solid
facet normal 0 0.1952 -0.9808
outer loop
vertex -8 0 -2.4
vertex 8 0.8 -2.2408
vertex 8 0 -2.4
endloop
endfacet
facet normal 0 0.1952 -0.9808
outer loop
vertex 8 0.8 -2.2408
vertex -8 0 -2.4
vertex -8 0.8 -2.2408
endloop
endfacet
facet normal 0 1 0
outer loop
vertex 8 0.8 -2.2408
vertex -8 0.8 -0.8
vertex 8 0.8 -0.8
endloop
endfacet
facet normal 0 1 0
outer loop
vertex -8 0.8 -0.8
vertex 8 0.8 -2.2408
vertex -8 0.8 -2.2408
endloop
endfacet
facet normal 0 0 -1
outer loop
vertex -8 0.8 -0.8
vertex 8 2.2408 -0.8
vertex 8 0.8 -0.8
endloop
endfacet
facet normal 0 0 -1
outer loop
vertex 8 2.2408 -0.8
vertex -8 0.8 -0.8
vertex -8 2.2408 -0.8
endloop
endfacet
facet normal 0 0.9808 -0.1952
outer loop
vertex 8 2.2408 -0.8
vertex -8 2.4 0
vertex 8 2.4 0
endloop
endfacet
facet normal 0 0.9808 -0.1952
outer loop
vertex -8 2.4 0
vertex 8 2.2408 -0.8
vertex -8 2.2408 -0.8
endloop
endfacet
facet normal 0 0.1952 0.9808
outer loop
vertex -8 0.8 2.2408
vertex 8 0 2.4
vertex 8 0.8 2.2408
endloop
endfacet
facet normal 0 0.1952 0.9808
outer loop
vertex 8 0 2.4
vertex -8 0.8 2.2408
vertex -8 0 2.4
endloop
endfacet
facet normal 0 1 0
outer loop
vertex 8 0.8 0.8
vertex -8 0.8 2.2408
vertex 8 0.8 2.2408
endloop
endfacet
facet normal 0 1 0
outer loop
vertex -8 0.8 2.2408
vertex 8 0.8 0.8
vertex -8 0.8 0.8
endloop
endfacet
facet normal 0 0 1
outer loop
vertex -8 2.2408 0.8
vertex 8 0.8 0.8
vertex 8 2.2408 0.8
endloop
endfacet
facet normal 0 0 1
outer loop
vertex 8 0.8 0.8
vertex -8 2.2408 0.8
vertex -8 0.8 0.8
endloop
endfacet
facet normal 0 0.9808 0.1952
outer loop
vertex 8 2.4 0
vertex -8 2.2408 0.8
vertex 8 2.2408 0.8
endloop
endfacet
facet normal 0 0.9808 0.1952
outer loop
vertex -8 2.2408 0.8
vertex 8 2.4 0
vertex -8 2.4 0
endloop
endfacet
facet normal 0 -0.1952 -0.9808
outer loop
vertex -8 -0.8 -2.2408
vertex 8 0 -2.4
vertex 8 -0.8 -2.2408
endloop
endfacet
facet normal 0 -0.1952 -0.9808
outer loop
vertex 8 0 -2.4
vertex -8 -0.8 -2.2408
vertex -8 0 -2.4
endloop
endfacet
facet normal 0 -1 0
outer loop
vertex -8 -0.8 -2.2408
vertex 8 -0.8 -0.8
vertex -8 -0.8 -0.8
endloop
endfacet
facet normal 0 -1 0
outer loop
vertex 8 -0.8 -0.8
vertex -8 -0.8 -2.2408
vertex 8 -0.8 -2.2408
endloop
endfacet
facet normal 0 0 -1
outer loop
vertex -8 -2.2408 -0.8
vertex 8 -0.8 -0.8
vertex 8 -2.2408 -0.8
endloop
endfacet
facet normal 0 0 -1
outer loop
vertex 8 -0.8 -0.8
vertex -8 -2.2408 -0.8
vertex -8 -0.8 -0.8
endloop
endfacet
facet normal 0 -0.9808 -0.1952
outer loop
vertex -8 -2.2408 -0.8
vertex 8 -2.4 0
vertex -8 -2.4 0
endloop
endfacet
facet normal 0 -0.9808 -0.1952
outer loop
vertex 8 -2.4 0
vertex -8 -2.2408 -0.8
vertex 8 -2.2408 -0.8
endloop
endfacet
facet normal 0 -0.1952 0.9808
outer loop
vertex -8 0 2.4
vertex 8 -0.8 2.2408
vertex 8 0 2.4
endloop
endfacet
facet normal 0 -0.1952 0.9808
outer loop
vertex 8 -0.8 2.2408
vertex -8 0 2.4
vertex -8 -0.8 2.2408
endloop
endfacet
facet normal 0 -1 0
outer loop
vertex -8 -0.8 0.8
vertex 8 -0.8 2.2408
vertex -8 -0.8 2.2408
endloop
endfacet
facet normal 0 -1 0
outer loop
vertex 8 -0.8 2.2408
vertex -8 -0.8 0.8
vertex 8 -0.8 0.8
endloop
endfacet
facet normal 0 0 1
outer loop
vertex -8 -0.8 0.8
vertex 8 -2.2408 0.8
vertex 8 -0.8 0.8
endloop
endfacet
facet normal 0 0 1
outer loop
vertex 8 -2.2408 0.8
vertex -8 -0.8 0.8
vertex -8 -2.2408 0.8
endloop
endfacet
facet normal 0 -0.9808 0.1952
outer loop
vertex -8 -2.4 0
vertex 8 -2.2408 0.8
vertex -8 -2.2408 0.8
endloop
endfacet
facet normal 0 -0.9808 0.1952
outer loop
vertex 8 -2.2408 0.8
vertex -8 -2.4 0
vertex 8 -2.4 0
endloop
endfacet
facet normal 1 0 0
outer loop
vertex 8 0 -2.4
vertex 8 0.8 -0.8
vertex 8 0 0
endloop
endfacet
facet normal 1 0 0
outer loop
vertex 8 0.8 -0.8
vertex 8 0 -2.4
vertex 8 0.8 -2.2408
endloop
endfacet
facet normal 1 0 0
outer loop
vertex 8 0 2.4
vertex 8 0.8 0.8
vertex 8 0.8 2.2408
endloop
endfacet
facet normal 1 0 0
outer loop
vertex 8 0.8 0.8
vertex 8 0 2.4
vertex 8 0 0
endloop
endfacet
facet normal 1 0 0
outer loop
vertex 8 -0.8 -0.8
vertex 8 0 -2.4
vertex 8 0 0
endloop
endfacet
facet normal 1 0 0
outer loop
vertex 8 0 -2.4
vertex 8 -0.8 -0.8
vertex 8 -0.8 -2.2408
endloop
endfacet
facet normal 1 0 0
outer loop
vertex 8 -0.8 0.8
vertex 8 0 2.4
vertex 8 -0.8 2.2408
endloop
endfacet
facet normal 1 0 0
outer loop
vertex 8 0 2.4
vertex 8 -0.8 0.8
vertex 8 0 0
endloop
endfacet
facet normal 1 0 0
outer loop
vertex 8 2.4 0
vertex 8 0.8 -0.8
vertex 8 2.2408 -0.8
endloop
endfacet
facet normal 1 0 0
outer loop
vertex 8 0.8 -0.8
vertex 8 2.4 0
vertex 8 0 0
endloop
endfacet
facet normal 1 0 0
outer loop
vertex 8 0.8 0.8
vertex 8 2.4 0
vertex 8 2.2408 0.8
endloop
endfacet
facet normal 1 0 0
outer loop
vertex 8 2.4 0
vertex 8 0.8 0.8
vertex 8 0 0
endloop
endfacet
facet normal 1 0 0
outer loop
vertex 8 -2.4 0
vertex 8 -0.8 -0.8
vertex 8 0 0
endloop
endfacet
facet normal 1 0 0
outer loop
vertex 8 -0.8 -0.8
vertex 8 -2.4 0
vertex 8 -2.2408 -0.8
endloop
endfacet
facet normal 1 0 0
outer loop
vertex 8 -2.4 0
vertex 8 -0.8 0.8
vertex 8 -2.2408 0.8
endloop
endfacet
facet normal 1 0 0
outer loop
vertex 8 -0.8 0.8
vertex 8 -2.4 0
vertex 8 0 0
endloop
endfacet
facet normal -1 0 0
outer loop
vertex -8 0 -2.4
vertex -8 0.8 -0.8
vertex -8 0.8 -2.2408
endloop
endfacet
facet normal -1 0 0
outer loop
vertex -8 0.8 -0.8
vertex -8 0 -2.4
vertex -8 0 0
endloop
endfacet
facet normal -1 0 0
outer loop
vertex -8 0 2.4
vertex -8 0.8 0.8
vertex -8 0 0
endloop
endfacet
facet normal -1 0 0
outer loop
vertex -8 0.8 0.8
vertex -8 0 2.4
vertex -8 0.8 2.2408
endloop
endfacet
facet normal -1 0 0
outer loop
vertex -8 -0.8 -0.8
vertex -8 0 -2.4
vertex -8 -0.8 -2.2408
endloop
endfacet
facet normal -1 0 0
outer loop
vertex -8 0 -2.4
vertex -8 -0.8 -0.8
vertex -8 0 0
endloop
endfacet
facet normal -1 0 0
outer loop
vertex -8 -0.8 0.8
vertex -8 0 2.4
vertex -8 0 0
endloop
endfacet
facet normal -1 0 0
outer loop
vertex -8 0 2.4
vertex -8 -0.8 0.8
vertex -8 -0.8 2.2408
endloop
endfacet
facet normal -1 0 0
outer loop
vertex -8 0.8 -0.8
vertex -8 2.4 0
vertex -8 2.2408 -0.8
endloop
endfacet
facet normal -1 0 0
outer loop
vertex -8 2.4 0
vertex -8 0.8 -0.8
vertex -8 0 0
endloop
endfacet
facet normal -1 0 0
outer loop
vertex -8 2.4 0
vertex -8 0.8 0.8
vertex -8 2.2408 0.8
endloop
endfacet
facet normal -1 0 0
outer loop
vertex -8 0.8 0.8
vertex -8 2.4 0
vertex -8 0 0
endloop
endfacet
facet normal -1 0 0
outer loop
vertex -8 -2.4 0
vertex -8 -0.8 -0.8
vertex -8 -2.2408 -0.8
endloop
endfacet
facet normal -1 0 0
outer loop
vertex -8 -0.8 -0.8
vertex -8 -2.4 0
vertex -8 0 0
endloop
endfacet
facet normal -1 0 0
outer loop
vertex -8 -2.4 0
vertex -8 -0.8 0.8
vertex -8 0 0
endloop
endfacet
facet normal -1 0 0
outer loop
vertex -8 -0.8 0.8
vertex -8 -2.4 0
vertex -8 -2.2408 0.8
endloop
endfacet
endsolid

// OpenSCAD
// file: ../p/axle.scad
use <../lib.scad>
function ldraw_lib__axle() = [
// 0 Axle
// 0 Name: axle.dat
// 0 Author: James Jessiman
// 0 !LDRAW_ORG Primitive UPDATE 2003-01
// 0 !LICENSE Licensed under CC BY 2.0 and CC BY 4.0 : see CAreadme.txt
// 
// 0 BFC CERTIFY CCW
  [0,"BFC","CERTIFY"],
  [0,"BFC","CCW"],
// 
// 0 !HISTORY 2000-04-23 [sbliss] Added conditional edges along outermost diameters
// 0 !HISTORY 2000-05-07 [PTadmin] Official Update 2000-01
// 0 !HISTORY 2002-11-08 [OrionP] Adjusted fit and precision
// 0 !HISTORY 2003-03-12 [PTadmin] Official Update 2003-01
// 0 !HISTORY 2007-06-24 [PTadmin] Header formatted for Contributor Agreement
// 0 !HISTORY 2008-07-01 [PTadmin] Official Update 2008-01
// 
// 
// 5 24 6 0 0 6 1 0 5.602 0 2 5.602 0 -2
  [5,24,6,0,0,6,1,0,5.602,0,2,5.602,0,-2],
// 5 24 0 0 6 0 1 6 2 0 5.602 -2 0 5.602
  [5,24,0,0,6,0,1,6,2,0,5.602,-2,0,5.602],
// 5 24 -6 0 0 -6 1 0 -5.602 0 -2 -5.602 0 2
  [5,24,-6,0,0,-6,1,0,-5.602,0,-2,-5.602,0,2],
// 5 24 0 0 -6 0 1 -6 -2 0 -5.602 2 0 -5.602
  [5,24,0,0,-6,0,1,-6,-2,0,-5.602,2,0,-5.602],
// 
// 2 24 6 0 0 5.602 0 2
  [2,24,6,0,0,5.602,0,2],
// 2 24 5.602 0 2 2 0 2
  [2,24,5.602,0,2,2,0,2],
// 2 24 2 0 2 2 0 5.602
  [2,24,2,0,2,2,0,5.602],
// 2 24 2 0 5.602 0 0 6
  [2,24,2,0,5.602,0,0,6],
// 2 24 -6 0 0 -5.602 0 2
  [2,24,-6,0,0,-5.602,0,2],
// 2 24 -5.602 0 2 -2 0 2
  [2,24,-5.602,0,2,-2,0,2],
// 2 24 -2 0 2 -2 0 5.602
  [2,24,-2,0,2,-2,0,5.602],
// 2 24 -2 0 5.602 -0 0 6
  [2,24,-2,0,5.602,-0,0,6],
// 2 24 6 0 -0 5.602 0 -2
  [2,24,6,0,-0,5.602,0,-2],
// 2 24 5.602 0 -2 2 0 -2
  [2,24,5.602,0,-2,2,0,-2],
// 2 24 2 0 -2 2 0 -5.602
  [2,24,2,0,-2,2,0,-5.602],
// 2 24 2 0 -5.602 0 0 -6
  [2,24,2,0,-5.602,0,0,-6],
// 2 24 -6 0 -0 -5.602 0 -2
  [2,24,-6,0,-0,-5.602,0,-2],
// 2 24 -5.602 0 -2 -2 0 -2
  [2,24,-5.602,0,-2,-2,0,-2],
// 2 24 -2 0 -2 -2 0 -5.602
  [2,24,-2,0,-2,-2,0,-5.602],
// 2 24 -2 0 -5.602 -0 0 -6
  [2,24,-2,0,-5.602,-0,0,-6],
// 2 24 6 1 0 5.602 1 2
  [2,24,6,1,0,5.602,1,2],
// 2 24 5.602 1 2 2 1 2
  [2,24,5.602,1,2,2,1,2],
// 2 24 2 1 2 2 1 5.602
  [2,24,2,1,2,2,1,5.602],
// 2 24 2 1 5.602 0 1 6
  [2,24,2,1,5.602,0,1,6],
// 2 24 -6 1 0 -5.602 1 2
  [2,24,-6,1,0,-5.602,1,2],
// 2 24 -5.602 1 2 -2 1 2
  [2,24,-5.602,1,2,-2,1,2],
// 2 24 -2 1 2 -2 1 5.602
  [2,24,-2,1,2,-2,1,5.602],
// 2 24 -2 1 5.602 -0 1 6
  [2,24,-2,1,5.602,-0,1,6],
// 2 24 6 1 -0 5.602 1 -2
  [2,24,6,1,-0,5.602,1,-2],
// 2 24 5.602 1 -2 2 1 -2
  [2,24,5.602,1,-2,2,1,-2],
// 2 24 2 1 -2 2 1 -5.602
  [2,24,2,1,-2,2,1,-5.602],
// 2 24 2 1 -5.602 0 1 -6
  [2,24,2,1,-5.602,0,1,-6],
// 2 24 -6 1 -0 -5.602 1 -2
  [2,24,-6,1,-0,-5.602,1,-2],
// 2 24 -5.602 1 -2 -2 1 -2
  [2,24,-5.602,1,-2,-2,1,-2],
// 2 24 -2 1 -2 -2 1 -5.602
  [2,24,-2,1,-2,-2,1,-5.602],
// 2 24 -2 1 -5.602 -0 1 -6
  [2,24,-2,1,-5.602,-0,1,-6],
// 
// 2 24 5.602 0 2 5.602 1 2
  [2,24,5.602,0,2,5.602,1,2],
// 2 24 2 0 2 2 1 2
  [2,24,2,0,2,2,1,2],
// 2 24 2 0 5.602 2 1 5.602
  [2,24,2,0,5.602,2,1,5.602],
// 2 24 -5.602 0 2 -5.602 1 2
  [2,24,-5.602,0,2,-5.602,1,2],
// 2 24 -2 0 2 -2 1 2
  [2,24,-2,0,2,-2,1,2],
// 2 24 -2 0 5.602 -2 1 5.602
  [2,24,-2,0,5.602,-2,1,5.602],
// 2 24 5.602 0 -2 5.602 1 -2
  [2,24,5.602,0,-2,5.602,1,-2],
// 2 24 2 0 -2 2 1 -2
  [2,24,2,0,-2,2,1,-2],
// 2 24 2 0 -5.602 2 1 -5.602
  [2,24,2,0,-5.602,2,1,-5.602],
// 2 24 -5.602 0 -2 -5.602 1 -2
  [2,24,-5.602,0,-2,-5.602,1,-2],
// 2 24 -2 0 -2 -2 1 -2
  [2,24,-2,0,-2,-2,1,-2],
// 2 24 -2 0 -5.602 -2 1 -5.602
  [2,24,-2,0,-5.602,-2,1,-5.602],
// 
// 4 16 6 0 0 6 1 0 5.602 1 2 5.602 0 2
  [4,16,6,0,0,6,1,0,5.602,1,2,5.602,0,2],
// 4 16 5.602 0 2 5.602 1 2 2 1 2 2 0 2
  [4,16,5.602,0,2,5.602,1,2,2,1,2,2,0,2],
// 4 16 2 0 2 2 1 2 2 1 5.602 2 0 5.602
  [4,16,2,0,2,2,1,2,2,1,5.602,2,0,5.602],
// 4 16 2 0 5.602 2 1 5.602 0 1 6 0 0 6
  [4,16,2,0,5.602,2,1,5.602,0,1,6,0,0,6],
// 4 16 -6 0 0 -5.602 0 2 -5.602 1 2 -6 1 0
  [4,16,-6,0,0,-5.602,0,2,-5.602,1,2,-6,1,0],
// 4 16 -5.602 0 2 -2 0 2 -2 1 2 -5.602 1 2
  [4,16,-5.602,0,2,-2,0,2,-2,1,2,-5.602,1,2],
// 4 16 -2 0 2 -2 0 5.602 -2 1 5.602 -2 1 2
  [4,16,-2,0,2,-2,0,5.602,-2,1,5.602,-2,1,2],
// 4 16 -2 0 5.602 -0 0 6 -0 1 6 -2 1 5.602
  [4,16,-2,0,5.602,-0,0,6,-0,1,6,-2,1,5.602],
// 4 16 6 0 -0 5.602 0 -2 5.602 1 -2 6 1 -0
  [4,16,6,0,-0,5.602,0,-2,5.602,1,-2,6,1,-0],
// 4 16 5.602 0 -2 2 0 -2 2 1 -2 5.602 1 -2
  [4,16,5.602,0,-2,2,0,-2,2,1,-2,5.602,1,-2],
// 4 16 2 0 -2 2 0 -5.602 2 1 -5.602 2 1 -2
  [4,16,2,0,-2,2,0,-5.602,2,1,-5.602,2,1,-2],
// 4 16 2 0 -5.602 0 0 -6 0 1 -6 2 1 -5.602
  [4,16,2,0,-5.602,0,0,-6,0,1,-6,2,1,-5.602],
// 4 16 -6 0 -0 -6 1 -0 -5.602 1 -2 -5.602 0 -2
  [4,16,-6,0,-0,-6,1,-0,-5.602,1,-2,-5.602,0,-2],
// 4 16 -5.602 0 -2 -5.602 1 -2 -2 1 -2 -2 0 -2
  [4,16,-5.602,0,-2,-5.602,1,-2,-2,1,-2,-2,0,-2],
// 4 16 -2 0 -2 -2 1 -2 -2 1 -5.602 -2 0 -5.602
  [4,16,-2,0,-2,-2,1,-2,-2,1,-5.602,-2,0,-5.602],
// 4 16 -2 0 -5.602 -2 1 -5.602 -0 1 -6 -0 0 -6
  [4,16,-2,0,-5.602,-2,1,-5.602,-0,1,-6,-0,0,-6],
// 
// 4 16 6 0 0 5.602 0 2 2 0 2 0 0 0
  [4,16,6,0,0,5.602,0,2,2,0,2,0,0,0],
// 4 16 -6 0 0 0 0 0 -2 0 2 -5.602 0 2
  [4,16,-6,0,0,0,0,0,-2,0,2,-5.602,0,2],
// 4 16 6 0 0 0 0 0 2 0 -2 5.602 0 -2
  [4,16,6,0,0,0,0,0,2,0,-2,5.602,0,-2],
// 4 16 -6 0 0 -5.602 0 -2 -2 0 -2 0 0 0
  [4,16,-6,0,0,-5.602,0,-2,-2,0,-2,0,0,0],
// 4 16 0 0 6 0 0 0 2 0 2 2 0 5.602
  [4,16,0,0,6,0,0,0,2,0,2,2,0,5.602],
// 4 16 0 0 6 -2 0 5.602 -2 0 2 0 0 0
  [4,16,0,0,6,-2,0,5.602,-2,0,2,0,0,0],
// 4 16 0 0 -6 2 0 -5.602 2 0 -2 0 0 0
  [4,16,0,0,-6,2,0,-5.602,2,0,-2,0,0,0],
// 4 16 0 0 -6 0 0 0 -2 0 -2 -2 0 -5.602
  [4,16,0,0,-6,0,0,0,-2,0,-2,-2,0,-5.602],
// 4 16 6 1 0 0 1 0 2 1 2 5.602 1 2
  [4,16,6,1,0,0,1,0,2,1,2,5.602,1,2],
// 4 16 -6 1 0 -5.602 1 2 -2 1 2 0 1 0
  [4,16,-6,1,0,-5.602,1,2,-2,1,2,0,1,0],
// 4 16 6 1 0 5.602 1 -2 2 1 -2 0 1 0
  [4,16,6,1,0,5.602,1,-2,2,1,-2,0,1,0],
// 4 16 -6 1 0 0 1 0 -2 1 -2 -5.602 1 -2
  [4,16,-6,1,0,0,1,0,-2,1,-2,-5.602,1,-2],
// 4 16 0 1 6 2 1 5.602 2 1 2 0 1 0
  [4,16,0,1,6,2,1,5.602,2,1,2,0,1,0],
// 4 16 0 1 6 0 1 0 -2 1 2 -2 1 5.602
  [4,16,0,1,6,0,1,0,-2,1,2,-2,1,5.602],
// 4 16 0 1 -6 0 1 0 2 1 -2 2 1 -5.602
  [4,16,0,1,-6,0,1,0,2,1,-2,2,1,-5.602],
// 4 16 0 1 -6 -2 1 -5.602 -2 1 -2 0 1 0
  [4,16,0,1,-6,-2,1,-5.602,-2,1,-2,0,1,0],
// 0
];
makepoly(ldraw_lib__axle(), line=0.2);
// main file
use <../lib.scad>
use <../p/axle.scad>
function ldraw_lib__3704() = [
// 0 Technic Axle  2
// 0 Name: 3704.dat
// 0 Author: James Jessiman
// 0 !LDRAW_ORG Part UPDATE 2005-01
// 0 !LICENSE Licensed under CC BY 2.0 and CC BY 4.0 : see CAreadme.txt
// 
// 0 BFC CERTIFY CCW
  [0,"BFC","CERTIFY"],
  [0,"BFC","CCW"],
// 
// 0 !HISTORY 2004-07-11 [guyvivan] BFC'ed
// 0 !HISTORY 2005-12-28 [PTadmin] Official Update 2005-01
// 0 !HISTORY 2007-06-29 [PTadmin] Header formatted for Contributor Agreement
// 0 !HISTORY 2008-07-01 [PTadmin] Official Update 2008-01
// 
// 
// 1 16 20 0 0 0 -40 0 1 0 0 0 0 1 axle.dat
  [1,16,20,0,0,0,-40,0,1,0,0,0,0,1, ldraw_lib__axle()],
// 0
// 
];
makepoly(ldraw_lib__3704(), line=0.2);
